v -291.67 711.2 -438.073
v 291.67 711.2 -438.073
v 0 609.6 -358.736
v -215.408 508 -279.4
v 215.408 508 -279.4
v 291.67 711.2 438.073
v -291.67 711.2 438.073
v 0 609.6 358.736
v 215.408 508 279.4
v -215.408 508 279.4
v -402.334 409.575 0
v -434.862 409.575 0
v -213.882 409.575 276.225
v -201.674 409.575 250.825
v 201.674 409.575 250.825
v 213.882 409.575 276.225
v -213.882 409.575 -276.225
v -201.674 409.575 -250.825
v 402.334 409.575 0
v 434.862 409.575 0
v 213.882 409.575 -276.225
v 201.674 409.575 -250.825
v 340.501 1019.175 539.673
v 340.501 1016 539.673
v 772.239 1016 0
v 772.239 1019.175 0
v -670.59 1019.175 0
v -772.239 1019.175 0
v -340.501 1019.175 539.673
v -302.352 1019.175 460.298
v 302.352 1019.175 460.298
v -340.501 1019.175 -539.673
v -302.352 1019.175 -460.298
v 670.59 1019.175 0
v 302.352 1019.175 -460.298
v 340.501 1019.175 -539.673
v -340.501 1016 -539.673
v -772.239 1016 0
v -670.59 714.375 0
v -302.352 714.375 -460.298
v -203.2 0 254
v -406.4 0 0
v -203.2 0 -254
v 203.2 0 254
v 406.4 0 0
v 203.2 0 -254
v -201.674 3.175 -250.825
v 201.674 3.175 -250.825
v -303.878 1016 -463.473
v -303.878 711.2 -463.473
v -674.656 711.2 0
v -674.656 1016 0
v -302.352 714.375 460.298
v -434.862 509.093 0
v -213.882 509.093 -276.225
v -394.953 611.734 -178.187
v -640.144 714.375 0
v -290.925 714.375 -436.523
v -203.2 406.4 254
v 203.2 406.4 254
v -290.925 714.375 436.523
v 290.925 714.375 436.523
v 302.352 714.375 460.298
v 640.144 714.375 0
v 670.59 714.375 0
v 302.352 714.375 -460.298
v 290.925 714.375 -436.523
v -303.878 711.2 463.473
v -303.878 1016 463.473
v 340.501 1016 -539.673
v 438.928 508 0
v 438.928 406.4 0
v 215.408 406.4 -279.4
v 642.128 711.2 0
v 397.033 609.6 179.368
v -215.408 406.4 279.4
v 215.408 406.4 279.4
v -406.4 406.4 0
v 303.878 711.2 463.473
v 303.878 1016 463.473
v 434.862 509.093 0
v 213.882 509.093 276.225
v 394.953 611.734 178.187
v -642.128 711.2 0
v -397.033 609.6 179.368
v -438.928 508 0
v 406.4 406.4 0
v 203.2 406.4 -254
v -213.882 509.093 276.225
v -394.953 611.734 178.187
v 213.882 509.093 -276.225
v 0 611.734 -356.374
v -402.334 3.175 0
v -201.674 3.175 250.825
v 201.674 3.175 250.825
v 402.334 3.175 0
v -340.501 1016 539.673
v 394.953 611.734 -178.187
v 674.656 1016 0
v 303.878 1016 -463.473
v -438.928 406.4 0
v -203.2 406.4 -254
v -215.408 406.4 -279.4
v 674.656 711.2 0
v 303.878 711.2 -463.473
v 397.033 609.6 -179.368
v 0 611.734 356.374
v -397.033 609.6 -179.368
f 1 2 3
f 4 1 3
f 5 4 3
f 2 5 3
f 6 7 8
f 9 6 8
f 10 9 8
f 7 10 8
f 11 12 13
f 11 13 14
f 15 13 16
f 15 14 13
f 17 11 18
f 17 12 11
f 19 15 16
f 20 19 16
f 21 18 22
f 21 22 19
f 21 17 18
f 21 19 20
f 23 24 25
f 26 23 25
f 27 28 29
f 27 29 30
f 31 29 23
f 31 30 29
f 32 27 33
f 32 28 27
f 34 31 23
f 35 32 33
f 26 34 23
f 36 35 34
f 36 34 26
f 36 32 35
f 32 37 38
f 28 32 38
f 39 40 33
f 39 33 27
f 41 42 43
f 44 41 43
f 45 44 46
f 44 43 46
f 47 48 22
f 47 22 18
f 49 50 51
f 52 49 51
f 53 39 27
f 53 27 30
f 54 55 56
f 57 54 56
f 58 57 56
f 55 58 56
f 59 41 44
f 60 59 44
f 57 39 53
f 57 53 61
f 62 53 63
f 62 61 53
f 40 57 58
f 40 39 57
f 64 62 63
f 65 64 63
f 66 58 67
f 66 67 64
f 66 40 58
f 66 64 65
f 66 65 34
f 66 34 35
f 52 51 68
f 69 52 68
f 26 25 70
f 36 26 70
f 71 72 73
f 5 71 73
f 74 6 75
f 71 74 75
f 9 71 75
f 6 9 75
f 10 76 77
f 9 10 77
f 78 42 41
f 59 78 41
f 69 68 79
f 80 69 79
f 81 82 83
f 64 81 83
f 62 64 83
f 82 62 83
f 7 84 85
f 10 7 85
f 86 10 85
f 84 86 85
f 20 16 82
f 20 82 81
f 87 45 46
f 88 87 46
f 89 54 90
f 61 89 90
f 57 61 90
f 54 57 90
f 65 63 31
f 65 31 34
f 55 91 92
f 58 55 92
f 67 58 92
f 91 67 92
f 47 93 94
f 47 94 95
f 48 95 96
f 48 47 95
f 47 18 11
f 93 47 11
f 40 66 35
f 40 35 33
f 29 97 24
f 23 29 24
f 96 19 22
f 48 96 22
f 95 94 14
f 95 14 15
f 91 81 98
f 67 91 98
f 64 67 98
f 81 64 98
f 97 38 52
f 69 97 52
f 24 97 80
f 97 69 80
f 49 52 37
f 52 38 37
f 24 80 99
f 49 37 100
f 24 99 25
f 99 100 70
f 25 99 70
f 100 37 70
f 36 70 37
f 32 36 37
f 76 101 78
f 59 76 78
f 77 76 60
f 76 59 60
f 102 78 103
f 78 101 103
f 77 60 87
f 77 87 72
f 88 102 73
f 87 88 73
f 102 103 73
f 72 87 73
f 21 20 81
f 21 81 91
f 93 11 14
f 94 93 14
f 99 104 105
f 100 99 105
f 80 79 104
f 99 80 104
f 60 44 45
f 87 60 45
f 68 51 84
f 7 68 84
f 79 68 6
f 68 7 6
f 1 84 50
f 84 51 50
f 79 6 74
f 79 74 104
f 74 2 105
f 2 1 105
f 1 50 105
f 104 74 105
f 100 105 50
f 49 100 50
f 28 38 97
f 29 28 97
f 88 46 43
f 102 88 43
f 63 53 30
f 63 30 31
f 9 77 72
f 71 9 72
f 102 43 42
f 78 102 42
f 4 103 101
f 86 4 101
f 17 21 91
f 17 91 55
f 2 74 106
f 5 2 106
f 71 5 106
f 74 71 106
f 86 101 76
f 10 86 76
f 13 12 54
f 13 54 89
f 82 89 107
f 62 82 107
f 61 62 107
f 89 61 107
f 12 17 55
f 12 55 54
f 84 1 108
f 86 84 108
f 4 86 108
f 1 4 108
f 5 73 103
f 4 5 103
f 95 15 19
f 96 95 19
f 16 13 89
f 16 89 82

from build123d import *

# Parameters (mm, degrees)
BOSS_EXTRUDE1_DEPTH = 406.4
BOSS_EXTRUDE2_DEPTH = 101.6
BOSS_EXTRUDE3_DEPTH = 304.8
BOSS_EXTRUDE4_DEPTH = 3.175
SHELL3_START        = 3.175
SHELL3_DEPTH        = 1016
SHELL3_START_2      = 714.375
SHELL3_2_DEPTH      = 304.8
SHELL3_START_3      = 409.575
SHELL3_3_DEPTH      = 304.8


with BuildPart() as part:
    # Sketch2 → Boss-Extrude1 (new body)
    with BuildSketch(Plane(origin=(0, 0, 0), x_dir=(1, 0, 0), z_dir=(0, 1, 0))):
        Polygon((-203.2, 254), (-406.4, 0), (-203.2, -254), (203.2, -254), (406.4, 0), (203.2, 254), align=None)
    extrude(amount=BOSS_EXTRUDE1_DEPTH)

    # Sketch3 → Boss-Extrude2 (add)
    with BuildSketch(Plane(origin=(0, 406.4, 0), x_dir=(1, 0, 0), z_dir=(0, 1, 0))):
        Polygon((215.407871126, 279.4), (-215.407871126, 279.4), (-438.927871126, 0), (-215.407871126, -279.4), (215.407871126, -279.4), (438.927871126, 0), align=None)
    extrude(amount=BOSS_EXTRUDE2_DEPTH)

    # Sketch5 → Loft1 section 0
    with BuildSketch(Plane(origin=(0, 711.2, 0), x_dir=(1, 0, 0), z_dir=(0, 1, 0))):
        with BuildLine():
            Line((642.127871126, 0), (291.669837463, 438.072542079))
            Line((291.669837463, 438.072542079), (-291.669837463, 438.072542079))
            Line((-291.669837463, 438.072542079), (-642.127871126, 0))
            Line((-642.127871126, 0), (-291.669837463, -438.072542079))
            Line((-291.669837463, -438.072542079), (291.669837463, -438.072542079))
            Line((291.669837463, -438.072542079), (642.127871126, 0))
        make_face()
    # Sketch4 → Loft1 section 1
    with BuildSketch(Plane(origin=(0, 508, 0), x_dir=(1, 0, 0), z_dir=(0, 1, 0))):
        with BuildLine():
            Line((438.927871126, 0), (215.407871126, 279.4))
            Line((215.407871126, 279.4), (-215.407871126, 279.4))
            Line((-215.407871126, 279.4), (-438.927871126, 0))
            Line((-438.927871126, 0), (-215.407871126, -279.4))
            Line((-215.407871126, -279.4), (215.407871126, -279.4))
            Line((215.407871126, -279.4), (438.927871126, 0))
        make_face()
    loft()

    # Sketch6 → Boss-Extrude3 (add)
    with BuildSketch(Plane(origin=(0, 711.2, 0), x_dir=(1, 0, 0), z_dir=(0, 1, 0))):
        Polygon((303.877708589, -463.472542079), (674.655742252, 0), (303.877708589, 463.472542079), (-303.877708589, 463.472542079), (-674.655742252, 0), (-303.877708589, -463.472542079), align=None)
    extrude(amount=BOSS_EXTRUDE3_DEPTH)

    # Sketch7 → Boss-Extrude4 (add)
    with BuildSketch(Plane(origin=(0, 1016, 0), x_dir=(1, 0, 0), z_dir=(0, 1, 0))):
        Polygon((-340.501321968, -539.672542079), (340.501321968, -539.672542079), (772.239355631, 0), (340.501321968, 539.672542079), (-340.501321968, 539.672542079), (-772.239355631, 0), align=None)
    extrude(amount=BOSS_EXTRUDE4_DEPTH)

    # Shell3: read off the stored shape, not the designer's step
    # Shell3 outline → Shell3 (cut)
    with BuildSketch(Plane(origin=(0, 0, 0), x_dir=(1, 0, 0), z_dir=(0, 1, 0)).offset(SHELL3_START)):
        Polygon((201.674016109, 250.825), (-201.674016109, 250.825), (-402.334016109, 0), (-201.674016109, -250.825), (201.674016109, -250.825), (402.334016109, 0), align=None)
    extrude(amount=SHELL3_DEPTH, mode=Mode.SUBTRACT)

    # Shell3 2 outline → Shell3 2 (cut)
    with BuildSketch(Plane(origin=(0, 0, 0), x_dir=(1, 0, 0), z_dir=(0, 1, 0)).offset(SHELL3_START_2)):
        Polygon((-302.351724698, -460.297542079), (302.351724698, -460.297542079), (670.589758362, 0), (302.351724698, 460.297542079), (-302.351724698, 460.297542079), (-670.589758362, 0), align=None)
        Polygon((-402.334016109, 0), (-201.674016109, 250.825), (201.674016109, 250.825), (402.334016109, 0), (201.674016109, -250.825), (-201.674016109, -250.825), align=None, mode=Mode.SUBTRACT)
    extrude(amount=SHELL3_2_DEPTH, mode=Mode.SUBTRACT)

    # Shell3 3 outline → Shell3 3 (cut)
    with BuildSketch(Plane(origin=(0, 0, 0), x_dir=(1, 0, 0), z_dir=(0, 1, 0)).offset(SHELL3_START_3)):
        Polygon((434.861887235, 0), (213.881887235, 276.225), (-213.881887235, 276.225), (-434.861887235, 0), (-213.881887235, -276.225), (213.881887235, -276.225), align=None)
        Polygon((-402.334016109, 0), (-201.674016109, 250.825), (201.674016109, 250.825), (402.334016109, 0), (201.674016109, -250.825), (-201.674016109, -250.825), align=None, mode=Mode.SUBTRACT)
    extrude(amount=SHELL3_3_DEPTH, mode=Mode.SUBTRACT)

    # Shell3 4: loft between two sections, ruled curve by curve
    shell3_4_from = [
        Edge.make_line((-213.881887235, 509.092780496, -276.225), (-434.861887235, 509.092780496, 0)),
        Edge.make_line((-434.861887235, 509.092780496, 0), (-213.881887235, 509.092780496, 276.225)),
        Edge.make_line((213.881887235, 509.092780496, -276.225), (-213.881887235, 509.092780496, -276.225)),
        Edge.make_line((434.861887235, 509.092780496, 0), (213.881887235, 509.092780496, -276.225)),
        Edge.make_line((213.881887235, 509.092780496, 276.225), (434.861887235, 509.092780496, 0)),
        Edge.make_line((-213.881887235, 509.092780496, 276.225), (213.881887235, 509.092780496, 276.225)),
    ]
    shell3_4_to = [
        Edge.make_line((-290.925320864, 714.375, -436.523482344), (-640.144106739, 714.375, 0)),
        Edge.make_line((-640.144106739, 714.375, 0), (-290.925320864, 714.375, 436.523482344)),
        Edge.make_line((290.925320864, 714.375, -436.523482344), (-290.925320864, 714.375, -436.523482344)),
        Edge.make_line((640.144106739, 714.375, 0), (290.925320864, 714.375, -436.523482344)),
        Edge.make_line((290.925320864, 714.375, 436.523482344), (640.144106739, 714.375, 0)),
        Edge.make_line((-290.925320864, 714.375, 436.523482344), (290.925320864, 714.375, 436.523482344)),
    ]
    shell3_4 = Solid(Shell([*[Face.make_surface_from_curves(shell3_4_from[k], shell3_4_to[k]) for k in range(6)], Face(Wire(shell3_4_from)), Face(Wire(shell3_4_to))]))
    add(shell3_4, mode=Mode.SUBTRACT)


solid = part.part
